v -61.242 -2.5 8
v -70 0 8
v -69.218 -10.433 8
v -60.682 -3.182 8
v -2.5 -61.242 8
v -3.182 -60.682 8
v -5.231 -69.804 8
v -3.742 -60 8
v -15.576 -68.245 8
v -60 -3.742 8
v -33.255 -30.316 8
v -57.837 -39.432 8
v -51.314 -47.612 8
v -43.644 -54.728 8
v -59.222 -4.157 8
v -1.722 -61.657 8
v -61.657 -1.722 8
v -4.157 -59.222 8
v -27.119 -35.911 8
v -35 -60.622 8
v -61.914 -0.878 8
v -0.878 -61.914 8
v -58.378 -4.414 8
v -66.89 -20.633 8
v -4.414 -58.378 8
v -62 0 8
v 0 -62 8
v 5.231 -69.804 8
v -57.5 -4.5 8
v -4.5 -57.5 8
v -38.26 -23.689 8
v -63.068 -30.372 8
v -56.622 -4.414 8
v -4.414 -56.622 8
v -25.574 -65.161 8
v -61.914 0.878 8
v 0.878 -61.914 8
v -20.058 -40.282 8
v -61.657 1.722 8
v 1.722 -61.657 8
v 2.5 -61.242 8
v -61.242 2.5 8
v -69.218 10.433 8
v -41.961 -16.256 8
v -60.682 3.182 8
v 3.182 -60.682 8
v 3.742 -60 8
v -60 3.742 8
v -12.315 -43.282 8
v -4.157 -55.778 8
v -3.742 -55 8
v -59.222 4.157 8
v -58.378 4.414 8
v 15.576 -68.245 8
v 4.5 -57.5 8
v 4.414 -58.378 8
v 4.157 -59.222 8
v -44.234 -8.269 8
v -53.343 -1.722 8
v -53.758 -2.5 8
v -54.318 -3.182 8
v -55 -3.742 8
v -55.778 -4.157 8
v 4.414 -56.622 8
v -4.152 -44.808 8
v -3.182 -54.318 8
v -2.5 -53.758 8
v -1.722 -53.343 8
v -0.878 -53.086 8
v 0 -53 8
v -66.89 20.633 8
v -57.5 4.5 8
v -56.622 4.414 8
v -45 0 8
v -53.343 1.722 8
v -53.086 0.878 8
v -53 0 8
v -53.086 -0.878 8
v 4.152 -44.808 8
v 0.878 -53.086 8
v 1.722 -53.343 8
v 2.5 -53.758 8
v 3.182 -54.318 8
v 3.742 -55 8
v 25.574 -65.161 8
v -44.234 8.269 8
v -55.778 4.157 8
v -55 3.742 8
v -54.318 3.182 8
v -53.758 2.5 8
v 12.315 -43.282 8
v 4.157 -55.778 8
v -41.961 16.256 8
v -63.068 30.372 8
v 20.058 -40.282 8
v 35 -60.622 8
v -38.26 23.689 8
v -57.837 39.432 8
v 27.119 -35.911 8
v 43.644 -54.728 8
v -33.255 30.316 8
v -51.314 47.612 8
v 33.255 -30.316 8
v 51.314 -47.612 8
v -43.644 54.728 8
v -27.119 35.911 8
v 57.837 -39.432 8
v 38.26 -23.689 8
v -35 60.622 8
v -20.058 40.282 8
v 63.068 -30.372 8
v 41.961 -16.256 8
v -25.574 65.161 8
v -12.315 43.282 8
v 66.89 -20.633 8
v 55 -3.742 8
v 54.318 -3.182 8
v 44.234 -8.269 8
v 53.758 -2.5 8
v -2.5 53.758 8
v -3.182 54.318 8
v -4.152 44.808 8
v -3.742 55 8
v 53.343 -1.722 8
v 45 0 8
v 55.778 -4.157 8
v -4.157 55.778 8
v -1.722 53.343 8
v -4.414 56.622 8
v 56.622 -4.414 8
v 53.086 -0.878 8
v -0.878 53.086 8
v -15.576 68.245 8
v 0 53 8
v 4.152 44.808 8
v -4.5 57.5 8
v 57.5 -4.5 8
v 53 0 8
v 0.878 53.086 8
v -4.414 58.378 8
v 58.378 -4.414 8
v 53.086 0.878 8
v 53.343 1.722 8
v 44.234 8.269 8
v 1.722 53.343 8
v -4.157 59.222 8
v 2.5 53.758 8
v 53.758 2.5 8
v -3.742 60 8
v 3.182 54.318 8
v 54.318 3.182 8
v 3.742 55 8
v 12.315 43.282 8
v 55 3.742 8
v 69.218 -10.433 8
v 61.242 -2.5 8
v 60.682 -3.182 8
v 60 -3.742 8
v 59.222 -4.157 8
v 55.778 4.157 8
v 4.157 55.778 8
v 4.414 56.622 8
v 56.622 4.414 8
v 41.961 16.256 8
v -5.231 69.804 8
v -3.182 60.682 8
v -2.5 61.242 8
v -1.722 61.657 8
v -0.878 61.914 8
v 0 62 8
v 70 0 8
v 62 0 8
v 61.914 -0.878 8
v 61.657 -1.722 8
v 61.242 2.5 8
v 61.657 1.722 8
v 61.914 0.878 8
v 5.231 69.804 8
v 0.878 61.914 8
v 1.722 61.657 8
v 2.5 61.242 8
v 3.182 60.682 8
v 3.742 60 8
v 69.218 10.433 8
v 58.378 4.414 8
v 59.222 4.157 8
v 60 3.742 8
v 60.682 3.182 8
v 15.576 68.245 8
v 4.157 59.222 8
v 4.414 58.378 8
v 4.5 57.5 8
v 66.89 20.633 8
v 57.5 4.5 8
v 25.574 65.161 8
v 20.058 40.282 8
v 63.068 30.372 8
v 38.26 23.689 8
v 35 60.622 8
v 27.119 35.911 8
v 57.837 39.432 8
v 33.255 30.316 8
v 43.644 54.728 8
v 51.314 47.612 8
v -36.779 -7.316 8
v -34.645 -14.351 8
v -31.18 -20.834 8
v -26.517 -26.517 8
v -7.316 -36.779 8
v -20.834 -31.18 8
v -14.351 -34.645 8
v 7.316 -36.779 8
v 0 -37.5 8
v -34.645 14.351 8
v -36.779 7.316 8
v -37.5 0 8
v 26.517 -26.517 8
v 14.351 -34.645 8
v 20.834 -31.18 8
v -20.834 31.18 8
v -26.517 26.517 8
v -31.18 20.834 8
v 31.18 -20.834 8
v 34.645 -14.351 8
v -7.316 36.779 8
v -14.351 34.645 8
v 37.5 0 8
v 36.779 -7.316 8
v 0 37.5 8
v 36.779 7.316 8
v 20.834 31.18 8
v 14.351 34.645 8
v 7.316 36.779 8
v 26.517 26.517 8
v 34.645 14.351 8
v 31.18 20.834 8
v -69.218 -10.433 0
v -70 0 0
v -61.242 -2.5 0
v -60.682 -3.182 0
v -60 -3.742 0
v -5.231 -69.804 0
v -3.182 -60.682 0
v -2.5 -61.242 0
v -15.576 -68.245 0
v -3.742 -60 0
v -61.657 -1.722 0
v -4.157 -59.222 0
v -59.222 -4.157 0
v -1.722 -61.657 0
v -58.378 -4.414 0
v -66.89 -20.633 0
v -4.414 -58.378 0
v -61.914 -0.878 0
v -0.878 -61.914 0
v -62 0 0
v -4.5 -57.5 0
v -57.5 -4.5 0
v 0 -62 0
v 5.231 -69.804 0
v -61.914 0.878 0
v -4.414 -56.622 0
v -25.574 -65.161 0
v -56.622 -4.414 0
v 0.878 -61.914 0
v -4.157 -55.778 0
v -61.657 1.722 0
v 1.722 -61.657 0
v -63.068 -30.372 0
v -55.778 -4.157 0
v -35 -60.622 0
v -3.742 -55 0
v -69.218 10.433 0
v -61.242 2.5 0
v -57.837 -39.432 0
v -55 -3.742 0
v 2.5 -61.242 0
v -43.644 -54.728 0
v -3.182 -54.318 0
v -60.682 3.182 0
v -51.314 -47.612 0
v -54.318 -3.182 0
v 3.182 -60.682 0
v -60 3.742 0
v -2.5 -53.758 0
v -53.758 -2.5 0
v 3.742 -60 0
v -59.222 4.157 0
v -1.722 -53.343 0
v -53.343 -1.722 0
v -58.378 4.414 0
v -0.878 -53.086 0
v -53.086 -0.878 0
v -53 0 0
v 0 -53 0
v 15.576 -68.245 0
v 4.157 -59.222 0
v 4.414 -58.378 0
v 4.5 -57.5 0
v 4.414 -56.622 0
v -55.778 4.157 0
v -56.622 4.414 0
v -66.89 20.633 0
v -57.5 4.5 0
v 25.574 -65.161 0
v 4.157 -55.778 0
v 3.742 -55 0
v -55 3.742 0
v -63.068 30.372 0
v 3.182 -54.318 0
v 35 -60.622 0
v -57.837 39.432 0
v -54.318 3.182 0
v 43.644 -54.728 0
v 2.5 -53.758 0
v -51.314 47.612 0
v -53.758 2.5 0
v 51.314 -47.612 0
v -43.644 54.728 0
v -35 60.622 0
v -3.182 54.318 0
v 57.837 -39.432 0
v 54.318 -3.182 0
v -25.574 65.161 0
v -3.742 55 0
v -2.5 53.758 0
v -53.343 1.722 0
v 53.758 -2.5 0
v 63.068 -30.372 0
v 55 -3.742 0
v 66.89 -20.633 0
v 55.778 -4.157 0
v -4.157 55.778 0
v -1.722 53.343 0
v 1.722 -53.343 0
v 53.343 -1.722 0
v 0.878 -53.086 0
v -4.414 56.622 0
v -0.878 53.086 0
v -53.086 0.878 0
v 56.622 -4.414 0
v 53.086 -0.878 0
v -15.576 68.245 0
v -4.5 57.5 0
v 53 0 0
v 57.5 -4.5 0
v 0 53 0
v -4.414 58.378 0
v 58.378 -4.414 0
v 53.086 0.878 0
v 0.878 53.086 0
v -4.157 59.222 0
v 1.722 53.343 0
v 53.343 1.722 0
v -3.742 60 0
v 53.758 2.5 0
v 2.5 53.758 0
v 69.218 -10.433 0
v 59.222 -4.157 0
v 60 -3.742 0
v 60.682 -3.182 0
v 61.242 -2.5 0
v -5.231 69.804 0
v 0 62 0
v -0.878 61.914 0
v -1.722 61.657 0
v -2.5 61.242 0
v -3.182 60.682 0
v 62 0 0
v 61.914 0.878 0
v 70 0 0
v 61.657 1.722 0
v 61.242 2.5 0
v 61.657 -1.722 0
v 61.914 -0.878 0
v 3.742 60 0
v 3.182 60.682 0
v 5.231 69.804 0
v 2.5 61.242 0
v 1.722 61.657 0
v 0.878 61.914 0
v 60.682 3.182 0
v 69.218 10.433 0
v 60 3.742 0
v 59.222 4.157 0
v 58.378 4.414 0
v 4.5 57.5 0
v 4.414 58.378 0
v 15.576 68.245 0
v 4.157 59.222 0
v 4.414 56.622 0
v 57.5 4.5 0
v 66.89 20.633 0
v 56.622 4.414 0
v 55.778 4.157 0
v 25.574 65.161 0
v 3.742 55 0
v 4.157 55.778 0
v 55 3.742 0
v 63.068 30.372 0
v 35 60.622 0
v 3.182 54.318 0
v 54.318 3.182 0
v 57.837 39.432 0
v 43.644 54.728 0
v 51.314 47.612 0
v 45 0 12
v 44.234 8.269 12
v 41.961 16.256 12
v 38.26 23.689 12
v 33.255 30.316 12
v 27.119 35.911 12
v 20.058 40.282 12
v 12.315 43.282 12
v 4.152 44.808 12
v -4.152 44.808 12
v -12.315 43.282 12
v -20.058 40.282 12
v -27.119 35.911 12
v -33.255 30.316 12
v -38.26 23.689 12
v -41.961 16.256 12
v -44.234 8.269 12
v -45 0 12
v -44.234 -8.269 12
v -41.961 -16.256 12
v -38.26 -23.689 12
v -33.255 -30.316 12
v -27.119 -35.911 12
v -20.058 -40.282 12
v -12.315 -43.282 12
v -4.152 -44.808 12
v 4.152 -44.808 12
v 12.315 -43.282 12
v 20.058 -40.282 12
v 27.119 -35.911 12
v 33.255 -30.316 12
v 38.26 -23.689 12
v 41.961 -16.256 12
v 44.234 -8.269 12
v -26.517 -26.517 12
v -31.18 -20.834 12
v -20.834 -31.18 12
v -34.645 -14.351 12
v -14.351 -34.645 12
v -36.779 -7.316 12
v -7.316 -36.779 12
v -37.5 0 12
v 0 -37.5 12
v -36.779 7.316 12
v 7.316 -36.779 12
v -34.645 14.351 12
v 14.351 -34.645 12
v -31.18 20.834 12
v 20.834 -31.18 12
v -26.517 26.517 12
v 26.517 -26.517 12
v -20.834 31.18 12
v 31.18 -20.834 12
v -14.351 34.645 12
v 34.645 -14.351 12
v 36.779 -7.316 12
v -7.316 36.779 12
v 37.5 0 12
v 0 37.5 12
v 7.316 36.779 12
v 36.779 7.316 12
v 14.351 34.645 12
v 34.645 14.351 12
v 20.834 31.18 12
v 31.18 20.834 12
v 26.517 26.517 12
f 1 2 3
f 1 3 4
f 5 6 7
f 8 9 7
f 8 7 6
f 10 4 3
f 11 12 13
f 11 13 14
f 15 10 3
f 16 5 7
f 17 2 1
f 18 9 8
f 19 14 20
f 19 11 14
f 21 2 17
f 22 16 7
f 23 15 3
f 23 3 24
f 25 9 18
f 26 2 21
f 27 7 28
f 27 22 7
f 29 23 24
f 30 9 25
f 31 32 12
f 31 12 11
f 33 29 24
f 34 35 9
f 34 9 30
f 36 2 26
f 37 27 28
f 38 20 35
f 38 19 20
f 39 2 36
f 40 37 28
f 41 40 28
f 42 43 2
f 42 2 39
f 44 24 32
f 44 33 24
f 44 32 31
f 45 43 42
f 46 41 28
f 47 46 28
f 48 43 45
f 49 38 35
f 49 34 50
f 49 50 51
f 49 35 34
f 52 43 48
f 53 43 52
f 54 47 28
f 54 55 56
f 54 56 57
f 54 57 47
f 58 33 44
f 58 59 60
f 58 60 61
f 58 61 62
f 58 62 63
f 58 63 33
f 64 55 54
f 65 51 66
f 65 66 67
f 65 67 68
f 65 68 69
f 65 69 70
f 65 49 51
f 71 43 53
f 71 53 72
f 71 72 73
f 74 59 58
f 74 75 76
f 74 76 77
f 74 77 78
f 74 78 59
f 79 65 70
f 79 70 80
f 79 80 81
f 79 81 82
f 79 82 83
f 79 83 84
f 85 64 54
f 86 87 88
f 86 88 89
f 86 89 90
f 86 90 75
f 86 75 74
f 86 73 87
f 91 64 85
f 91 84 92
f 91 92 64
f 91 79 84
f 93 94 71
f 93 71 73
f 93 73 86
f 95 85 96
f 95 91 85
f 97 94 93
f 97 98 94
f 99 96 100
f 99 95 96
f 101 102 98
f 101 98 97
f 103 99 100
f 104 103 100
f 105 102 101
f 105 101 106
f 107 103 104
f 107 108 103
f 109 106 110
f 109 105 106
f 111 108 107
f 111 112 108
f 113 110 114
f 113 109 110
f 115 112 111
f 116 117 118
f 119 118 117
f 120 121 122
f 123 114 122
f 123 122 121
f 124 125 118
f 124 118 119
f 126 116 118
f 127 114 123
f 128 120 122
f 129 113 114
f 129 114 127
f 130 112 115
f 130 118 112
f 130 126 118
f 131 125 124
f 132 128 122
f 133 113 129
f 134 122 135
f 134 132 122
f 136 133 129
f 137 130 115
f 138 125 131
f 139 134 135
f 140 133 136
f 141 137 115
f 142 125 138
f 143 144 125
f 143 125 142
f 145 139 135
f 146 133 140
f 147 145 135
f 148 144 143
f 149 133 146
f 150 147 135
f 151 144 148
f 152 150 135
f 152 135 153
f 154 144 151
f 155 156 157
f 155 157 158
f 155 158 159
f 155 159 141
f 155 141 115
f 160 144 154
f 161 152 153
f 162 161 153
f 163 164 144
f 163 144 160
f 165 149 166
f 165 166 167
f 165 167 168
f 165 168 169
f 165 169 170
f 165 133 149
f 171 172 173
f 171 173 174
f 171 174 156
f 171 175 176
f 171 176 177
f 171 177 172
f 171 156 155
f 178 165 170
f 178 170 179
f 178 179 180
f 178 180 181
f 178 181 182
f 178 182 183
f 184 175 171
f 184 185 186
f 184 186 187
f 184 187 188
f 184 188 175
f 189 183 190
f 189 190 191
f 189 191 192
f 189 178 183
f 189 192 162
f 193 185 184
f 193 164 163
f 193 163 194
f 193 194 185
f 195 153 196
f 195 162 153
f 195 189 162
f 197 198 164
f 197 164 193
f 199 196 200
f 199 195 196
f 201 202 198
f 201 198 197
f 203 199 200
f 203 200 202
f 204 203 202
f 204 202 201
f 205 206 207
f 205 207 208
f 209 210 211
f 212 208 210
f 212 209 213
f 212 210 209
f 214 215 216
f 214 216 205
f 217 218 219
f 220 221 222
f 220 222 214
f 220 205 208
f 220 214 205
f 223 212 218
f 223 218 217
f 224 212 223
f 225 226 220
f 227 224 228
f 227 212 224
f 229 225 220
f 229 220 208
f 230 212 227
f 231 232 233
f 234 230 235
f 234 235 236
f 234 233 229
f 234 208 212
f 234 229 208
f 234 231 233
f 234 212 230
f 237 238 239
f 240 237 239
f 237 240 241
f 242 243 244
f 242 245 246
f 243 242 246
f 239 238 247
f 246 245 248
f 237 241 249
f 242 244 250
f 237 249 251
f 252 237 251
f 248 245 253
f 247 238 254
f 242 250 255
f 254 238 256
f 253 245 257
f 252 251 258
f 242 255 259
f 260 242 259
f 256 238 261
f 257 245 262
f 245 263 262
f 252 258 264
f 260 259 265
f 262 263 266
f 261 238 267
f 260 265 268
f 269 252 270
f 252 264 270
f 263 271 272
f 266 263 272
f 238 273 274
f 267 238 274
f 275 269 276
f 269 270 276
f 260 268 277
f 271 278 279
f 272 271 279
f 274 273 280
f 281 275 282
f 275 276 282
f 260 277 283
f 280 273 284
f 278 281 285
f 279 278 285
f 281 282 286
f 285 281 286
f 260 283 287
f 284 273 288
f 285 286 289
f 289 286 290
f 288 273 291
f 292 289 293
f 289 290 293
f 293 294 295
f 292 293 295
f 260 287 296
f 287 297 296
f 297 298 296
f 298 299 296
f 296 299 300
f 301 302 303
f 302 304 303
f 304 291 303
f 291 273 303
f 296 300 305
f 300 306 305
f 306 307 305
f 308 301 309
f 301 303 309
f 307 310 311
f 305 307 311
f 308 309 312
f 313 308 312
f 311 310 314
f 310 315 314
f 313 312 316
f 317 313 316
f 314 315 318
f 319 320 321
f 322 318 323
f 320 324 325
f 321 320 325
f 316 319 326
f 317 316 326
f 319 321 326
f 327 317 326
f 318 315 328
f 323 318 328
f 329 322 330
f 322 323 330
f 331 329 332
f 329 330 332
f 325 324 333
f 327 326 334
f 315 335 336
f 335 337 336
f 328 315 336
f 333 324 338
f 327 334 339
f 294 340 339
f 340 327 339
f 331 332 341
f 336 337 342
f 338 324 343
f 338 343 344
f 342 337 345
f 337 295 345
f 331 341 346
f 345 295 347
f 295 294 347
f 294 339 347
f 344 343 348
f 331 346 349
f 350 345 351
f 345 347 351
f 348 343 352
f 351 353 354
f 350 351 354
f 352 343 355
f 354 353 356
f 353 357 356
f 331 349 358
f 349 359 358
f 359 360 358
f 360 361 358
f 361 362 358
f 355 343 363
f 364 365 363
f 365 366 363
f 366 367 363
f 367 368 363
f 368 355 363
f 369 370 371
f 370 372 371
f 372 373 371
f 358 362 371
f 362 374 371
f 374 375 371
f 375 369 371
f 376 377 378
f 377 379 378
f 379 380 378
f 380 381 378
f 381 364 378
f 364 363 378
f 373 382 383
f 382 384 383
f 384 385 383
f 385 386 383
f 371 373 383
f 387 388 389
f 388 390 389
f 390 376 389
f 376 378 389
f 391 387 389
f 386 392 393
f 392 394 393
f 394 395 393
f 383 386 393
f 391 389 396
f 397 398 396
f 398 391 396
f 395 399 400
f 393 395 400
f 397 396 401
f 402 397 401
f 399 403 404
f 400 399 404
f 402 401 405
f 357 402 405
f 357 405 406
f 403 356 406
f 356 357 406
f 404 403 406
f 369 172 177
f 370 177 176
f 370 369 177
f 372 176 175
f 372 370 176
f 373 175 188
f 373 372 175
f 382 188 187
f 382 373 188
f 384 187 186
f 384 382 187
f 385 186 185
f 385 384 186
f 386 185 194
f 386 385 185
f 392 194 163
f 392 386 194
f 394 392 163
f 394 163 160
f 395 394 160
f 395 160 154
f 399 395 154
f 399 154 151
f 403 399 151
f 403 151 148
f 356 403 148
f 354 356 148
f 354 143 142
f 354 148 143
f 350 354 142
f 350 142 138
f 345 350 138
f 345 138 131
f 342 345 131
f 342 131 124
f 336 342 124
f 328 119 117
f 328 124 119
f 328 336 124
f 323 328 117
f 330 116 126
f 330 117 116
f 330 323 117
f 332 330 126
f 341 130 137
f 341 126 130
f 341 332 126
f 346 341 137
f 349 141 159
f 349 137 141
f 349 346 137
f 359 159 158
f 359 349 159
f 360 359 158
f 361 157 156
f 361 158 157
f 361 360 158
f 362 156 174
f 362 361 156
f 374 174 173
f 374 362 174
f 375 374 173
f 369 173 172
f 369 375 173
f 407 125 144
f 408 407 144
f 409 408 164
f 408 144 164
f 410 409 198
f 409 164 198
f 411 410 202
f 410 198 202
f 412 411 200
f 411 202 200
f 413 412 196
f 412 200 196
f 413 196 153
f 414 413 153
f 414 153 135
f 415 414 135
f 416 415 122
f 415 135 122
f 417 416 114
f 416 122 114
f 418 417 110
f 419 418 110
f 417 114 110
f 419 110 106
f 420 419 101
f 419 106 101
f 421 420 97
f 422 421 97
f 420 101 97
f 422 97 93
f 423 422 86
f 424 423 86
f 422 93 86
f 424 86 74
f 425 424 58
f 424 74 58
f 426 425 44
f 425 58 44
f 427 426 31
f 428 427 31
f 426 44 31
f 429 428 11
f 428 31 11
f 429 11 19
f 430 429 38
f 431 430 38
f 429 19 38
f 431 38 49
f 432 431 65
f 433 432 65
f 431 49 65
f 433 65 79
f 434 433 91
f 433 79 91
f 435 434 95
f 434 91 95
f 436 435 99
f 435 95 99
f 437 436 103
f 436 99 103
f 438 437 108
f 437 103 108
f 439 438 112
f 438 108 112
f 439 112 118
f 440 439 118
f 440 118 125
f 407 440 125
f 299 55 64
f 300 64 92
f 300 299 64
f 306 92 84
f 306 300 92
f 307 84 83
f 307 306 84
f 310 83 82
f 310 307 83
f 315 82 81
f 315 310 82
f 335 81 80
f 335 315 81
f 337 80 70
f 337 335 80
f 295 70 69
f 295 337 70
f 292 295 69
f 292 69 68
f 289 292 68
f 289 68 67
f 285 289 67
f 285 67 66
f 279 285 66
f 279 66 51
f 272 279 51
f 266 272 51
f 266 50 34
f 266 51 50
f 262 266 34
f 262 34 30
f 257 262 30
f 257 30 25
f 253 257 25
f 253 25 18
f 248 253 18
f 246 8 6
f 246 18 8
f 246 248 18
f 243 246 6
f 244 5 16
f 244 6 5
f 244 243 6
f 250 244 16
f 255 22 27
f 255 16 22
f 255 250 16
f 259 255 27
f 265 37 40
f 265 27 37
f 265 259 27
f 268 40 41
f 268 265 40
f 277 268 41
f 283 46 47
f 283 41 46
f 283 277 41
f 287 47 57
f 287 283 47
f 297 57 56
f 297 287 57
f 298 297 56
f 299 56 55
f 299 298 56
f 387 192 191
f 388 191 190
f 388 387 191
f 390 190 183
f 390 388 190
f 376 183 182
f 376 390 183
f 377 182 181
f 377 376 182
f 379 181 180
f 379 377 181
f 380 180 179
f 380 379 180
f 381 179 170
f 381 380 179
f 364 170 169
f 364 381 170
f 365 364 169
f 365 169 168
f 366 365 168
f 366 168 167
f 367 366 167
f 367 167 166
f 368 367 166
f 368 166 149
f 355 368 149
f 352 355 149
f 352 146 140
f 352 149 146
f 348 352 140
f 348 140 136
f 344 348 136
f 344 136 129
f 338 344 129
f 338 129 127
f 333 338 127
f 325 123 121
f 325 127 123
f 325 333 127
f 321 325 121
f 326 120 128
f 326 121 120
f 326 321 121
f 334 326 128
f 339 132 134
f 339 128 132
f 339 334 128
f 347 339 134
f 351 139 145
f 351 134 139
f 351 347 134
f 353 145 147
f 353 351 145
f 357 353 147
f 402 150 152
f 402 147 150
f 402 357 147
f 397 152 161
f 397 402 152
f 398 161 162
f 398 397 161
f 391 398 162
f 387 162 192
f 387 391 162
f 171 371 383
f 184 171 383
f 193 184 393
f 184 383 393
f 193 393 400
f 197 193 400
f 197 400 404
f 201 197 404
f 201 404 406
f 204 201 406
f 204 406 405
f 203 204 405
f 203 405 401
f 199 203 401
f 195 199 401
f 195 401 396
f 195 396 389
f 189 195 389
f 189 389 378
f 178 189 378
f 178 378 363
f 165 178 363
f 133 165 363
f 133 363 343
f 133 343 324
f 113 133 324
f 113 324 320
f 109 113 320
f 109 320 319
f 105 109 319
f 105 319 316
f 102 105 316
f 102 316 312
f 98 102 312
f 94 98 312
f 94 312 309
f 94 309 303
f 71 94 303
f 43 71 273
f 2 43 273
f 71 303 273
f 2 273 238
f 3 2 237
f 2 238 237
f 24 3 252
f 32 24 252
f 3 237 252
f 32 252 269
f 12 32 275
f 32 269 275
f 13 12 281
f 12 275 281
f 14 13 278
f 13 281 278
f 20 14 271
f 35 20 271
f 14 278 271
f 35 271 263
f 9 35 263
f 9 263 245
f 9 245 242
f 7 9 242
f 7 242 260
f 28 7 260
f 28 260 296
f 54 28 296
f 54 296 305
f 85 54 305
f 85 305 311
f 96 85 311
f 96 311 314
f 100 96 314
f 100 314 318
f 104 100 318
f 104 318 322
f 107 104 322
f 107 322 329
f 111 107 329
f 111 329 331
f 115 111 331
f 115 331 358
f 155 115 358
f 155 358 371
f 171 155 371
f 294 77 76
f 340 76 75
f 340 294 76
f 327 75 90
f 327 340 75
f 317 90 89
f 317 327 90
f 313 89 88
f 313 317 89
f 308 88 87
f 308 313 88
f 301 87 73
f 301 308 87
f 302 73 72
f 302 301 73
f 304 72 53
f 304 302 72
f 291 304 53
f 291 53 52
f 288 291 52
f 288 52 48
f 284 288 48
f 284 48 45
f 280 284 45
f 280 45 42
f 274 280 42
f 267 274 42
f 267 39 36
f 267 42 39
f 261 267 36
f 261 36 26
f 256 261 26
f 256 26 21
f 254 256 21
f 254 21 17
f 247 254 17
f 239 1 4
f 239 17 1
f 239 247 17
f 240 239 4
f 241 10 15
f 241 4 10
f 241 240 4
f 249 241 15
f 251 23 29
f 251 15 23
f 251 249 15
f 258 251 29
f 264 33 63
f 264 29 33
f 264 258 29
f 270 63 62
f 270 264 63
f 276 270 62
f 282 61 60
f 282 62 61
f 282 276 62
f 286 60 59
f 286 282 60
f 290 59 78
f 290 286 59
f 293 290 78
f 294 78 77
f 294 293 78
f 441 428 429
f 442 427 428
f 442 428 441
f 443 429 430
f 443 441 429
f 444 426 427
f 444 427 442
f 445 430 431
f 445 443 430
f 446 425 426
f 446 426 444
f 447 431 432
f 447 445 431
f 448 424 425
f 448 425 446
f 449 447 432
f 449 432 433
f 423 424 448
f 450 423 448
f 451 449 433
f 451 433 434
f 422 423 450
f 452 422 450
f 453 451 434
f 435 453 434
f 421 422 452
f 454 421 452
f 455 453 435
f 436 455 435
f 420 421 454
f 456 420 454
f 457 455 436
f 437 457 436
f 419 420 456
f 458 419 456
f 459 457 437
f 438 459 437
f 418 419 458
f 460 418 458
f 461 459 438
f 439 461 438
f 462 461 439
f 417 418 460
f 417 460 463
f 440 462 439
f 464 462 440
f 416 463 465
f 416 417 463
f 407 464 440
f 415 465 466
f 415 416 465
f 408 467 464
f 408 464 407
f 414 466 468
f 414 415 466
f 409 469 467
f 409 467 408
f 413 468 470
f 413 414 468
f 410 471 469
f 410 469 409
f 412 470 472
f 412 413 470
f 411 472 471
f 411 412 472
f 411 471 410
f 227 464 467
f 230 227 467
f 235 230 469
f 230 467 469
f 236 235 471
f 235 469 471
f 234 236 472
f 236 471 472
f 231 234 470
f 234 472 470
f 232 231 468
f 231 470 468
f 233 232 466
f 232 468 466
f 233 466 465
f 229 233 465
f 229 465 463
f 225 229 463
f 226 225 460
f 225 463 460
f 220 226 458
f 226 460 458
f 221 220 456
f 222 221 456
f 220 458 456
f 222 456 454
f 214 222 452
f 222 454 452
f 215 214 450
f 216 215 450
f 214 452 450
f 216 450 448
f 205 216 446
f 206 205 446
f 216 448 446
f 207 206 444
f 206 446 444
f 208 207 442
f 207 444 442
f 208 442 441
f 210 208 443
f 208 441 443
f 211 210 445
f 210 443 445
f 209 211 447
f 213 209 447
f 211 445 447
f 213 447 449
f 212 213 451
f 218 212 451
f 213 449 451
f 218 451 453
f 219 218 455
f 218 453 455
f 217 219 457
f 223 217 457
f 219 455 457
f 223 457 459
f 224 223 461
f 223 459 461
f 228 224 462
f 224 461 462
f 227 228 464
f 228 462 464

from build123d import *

# Parameters (mm, degrees)
SKETCH1_R           = 70
SKETCH1_R_2         = 4.5
BOSS_EXTRUDE1_DEPTH = 12
CUT_EXTRUDE1_START  = -4
SKETCH2_R           = 70
SKETCH2_R_2         = 45
CUT_EXTRUDE1_DEPTH  = 4
SKETCH3_R           = 37.5
CUT_EXTRUDE2_DEPTH  = 4


with BuildPart() as part:
    # Sketch1 → Boss-Extrude1 (new body)
    with BuildSketch(Plane.XY):
        Circle(SKETCH1_R)
        with Locations((0, 57.5)):
            Circle(SKETCH1_R_2, mode=Mode.SUBTRACT)
        with Locations((57.5, 0)):
            Circle(SKETCH1_R_2, mode=Mode.SUBTRACT)
        with Locations((0, -57.5)):
            Circle(SKETCH1_R_2, mode=Mode.SUBTRACT)
        with Locations((-57.5, 0)):
            Circle(SKETCH1_R_2, mode=Mode.SUBTRACT)
    extrude(amount=BOSS_EXTRUDE1_DEPTH)

    # Sketch2 → Cut-Extrude1 (cut)
    with BuildSketch(Plane.XY.offset(12).offset(CUT_EXTRUDE1_START)):
        Circle(SKETCH2_R)
        Circle(SKETCH2_R_2, mode=Mode.SUBTRACT)
    extrude(amount=CUT_EXTRUDE1_DEPTH, mode=Mode.SUBTRACT)

    # Sketch3 → Cut-Extrude2 (cut)
    with BuildSketch(Plane.XY.offset(12)):
        Circle(SKETCH3_R)
    extrude(amount=-CUT_EXTRUDE2_DEPTH, mode=Mode.SUBTRACT)


solid = part.part
